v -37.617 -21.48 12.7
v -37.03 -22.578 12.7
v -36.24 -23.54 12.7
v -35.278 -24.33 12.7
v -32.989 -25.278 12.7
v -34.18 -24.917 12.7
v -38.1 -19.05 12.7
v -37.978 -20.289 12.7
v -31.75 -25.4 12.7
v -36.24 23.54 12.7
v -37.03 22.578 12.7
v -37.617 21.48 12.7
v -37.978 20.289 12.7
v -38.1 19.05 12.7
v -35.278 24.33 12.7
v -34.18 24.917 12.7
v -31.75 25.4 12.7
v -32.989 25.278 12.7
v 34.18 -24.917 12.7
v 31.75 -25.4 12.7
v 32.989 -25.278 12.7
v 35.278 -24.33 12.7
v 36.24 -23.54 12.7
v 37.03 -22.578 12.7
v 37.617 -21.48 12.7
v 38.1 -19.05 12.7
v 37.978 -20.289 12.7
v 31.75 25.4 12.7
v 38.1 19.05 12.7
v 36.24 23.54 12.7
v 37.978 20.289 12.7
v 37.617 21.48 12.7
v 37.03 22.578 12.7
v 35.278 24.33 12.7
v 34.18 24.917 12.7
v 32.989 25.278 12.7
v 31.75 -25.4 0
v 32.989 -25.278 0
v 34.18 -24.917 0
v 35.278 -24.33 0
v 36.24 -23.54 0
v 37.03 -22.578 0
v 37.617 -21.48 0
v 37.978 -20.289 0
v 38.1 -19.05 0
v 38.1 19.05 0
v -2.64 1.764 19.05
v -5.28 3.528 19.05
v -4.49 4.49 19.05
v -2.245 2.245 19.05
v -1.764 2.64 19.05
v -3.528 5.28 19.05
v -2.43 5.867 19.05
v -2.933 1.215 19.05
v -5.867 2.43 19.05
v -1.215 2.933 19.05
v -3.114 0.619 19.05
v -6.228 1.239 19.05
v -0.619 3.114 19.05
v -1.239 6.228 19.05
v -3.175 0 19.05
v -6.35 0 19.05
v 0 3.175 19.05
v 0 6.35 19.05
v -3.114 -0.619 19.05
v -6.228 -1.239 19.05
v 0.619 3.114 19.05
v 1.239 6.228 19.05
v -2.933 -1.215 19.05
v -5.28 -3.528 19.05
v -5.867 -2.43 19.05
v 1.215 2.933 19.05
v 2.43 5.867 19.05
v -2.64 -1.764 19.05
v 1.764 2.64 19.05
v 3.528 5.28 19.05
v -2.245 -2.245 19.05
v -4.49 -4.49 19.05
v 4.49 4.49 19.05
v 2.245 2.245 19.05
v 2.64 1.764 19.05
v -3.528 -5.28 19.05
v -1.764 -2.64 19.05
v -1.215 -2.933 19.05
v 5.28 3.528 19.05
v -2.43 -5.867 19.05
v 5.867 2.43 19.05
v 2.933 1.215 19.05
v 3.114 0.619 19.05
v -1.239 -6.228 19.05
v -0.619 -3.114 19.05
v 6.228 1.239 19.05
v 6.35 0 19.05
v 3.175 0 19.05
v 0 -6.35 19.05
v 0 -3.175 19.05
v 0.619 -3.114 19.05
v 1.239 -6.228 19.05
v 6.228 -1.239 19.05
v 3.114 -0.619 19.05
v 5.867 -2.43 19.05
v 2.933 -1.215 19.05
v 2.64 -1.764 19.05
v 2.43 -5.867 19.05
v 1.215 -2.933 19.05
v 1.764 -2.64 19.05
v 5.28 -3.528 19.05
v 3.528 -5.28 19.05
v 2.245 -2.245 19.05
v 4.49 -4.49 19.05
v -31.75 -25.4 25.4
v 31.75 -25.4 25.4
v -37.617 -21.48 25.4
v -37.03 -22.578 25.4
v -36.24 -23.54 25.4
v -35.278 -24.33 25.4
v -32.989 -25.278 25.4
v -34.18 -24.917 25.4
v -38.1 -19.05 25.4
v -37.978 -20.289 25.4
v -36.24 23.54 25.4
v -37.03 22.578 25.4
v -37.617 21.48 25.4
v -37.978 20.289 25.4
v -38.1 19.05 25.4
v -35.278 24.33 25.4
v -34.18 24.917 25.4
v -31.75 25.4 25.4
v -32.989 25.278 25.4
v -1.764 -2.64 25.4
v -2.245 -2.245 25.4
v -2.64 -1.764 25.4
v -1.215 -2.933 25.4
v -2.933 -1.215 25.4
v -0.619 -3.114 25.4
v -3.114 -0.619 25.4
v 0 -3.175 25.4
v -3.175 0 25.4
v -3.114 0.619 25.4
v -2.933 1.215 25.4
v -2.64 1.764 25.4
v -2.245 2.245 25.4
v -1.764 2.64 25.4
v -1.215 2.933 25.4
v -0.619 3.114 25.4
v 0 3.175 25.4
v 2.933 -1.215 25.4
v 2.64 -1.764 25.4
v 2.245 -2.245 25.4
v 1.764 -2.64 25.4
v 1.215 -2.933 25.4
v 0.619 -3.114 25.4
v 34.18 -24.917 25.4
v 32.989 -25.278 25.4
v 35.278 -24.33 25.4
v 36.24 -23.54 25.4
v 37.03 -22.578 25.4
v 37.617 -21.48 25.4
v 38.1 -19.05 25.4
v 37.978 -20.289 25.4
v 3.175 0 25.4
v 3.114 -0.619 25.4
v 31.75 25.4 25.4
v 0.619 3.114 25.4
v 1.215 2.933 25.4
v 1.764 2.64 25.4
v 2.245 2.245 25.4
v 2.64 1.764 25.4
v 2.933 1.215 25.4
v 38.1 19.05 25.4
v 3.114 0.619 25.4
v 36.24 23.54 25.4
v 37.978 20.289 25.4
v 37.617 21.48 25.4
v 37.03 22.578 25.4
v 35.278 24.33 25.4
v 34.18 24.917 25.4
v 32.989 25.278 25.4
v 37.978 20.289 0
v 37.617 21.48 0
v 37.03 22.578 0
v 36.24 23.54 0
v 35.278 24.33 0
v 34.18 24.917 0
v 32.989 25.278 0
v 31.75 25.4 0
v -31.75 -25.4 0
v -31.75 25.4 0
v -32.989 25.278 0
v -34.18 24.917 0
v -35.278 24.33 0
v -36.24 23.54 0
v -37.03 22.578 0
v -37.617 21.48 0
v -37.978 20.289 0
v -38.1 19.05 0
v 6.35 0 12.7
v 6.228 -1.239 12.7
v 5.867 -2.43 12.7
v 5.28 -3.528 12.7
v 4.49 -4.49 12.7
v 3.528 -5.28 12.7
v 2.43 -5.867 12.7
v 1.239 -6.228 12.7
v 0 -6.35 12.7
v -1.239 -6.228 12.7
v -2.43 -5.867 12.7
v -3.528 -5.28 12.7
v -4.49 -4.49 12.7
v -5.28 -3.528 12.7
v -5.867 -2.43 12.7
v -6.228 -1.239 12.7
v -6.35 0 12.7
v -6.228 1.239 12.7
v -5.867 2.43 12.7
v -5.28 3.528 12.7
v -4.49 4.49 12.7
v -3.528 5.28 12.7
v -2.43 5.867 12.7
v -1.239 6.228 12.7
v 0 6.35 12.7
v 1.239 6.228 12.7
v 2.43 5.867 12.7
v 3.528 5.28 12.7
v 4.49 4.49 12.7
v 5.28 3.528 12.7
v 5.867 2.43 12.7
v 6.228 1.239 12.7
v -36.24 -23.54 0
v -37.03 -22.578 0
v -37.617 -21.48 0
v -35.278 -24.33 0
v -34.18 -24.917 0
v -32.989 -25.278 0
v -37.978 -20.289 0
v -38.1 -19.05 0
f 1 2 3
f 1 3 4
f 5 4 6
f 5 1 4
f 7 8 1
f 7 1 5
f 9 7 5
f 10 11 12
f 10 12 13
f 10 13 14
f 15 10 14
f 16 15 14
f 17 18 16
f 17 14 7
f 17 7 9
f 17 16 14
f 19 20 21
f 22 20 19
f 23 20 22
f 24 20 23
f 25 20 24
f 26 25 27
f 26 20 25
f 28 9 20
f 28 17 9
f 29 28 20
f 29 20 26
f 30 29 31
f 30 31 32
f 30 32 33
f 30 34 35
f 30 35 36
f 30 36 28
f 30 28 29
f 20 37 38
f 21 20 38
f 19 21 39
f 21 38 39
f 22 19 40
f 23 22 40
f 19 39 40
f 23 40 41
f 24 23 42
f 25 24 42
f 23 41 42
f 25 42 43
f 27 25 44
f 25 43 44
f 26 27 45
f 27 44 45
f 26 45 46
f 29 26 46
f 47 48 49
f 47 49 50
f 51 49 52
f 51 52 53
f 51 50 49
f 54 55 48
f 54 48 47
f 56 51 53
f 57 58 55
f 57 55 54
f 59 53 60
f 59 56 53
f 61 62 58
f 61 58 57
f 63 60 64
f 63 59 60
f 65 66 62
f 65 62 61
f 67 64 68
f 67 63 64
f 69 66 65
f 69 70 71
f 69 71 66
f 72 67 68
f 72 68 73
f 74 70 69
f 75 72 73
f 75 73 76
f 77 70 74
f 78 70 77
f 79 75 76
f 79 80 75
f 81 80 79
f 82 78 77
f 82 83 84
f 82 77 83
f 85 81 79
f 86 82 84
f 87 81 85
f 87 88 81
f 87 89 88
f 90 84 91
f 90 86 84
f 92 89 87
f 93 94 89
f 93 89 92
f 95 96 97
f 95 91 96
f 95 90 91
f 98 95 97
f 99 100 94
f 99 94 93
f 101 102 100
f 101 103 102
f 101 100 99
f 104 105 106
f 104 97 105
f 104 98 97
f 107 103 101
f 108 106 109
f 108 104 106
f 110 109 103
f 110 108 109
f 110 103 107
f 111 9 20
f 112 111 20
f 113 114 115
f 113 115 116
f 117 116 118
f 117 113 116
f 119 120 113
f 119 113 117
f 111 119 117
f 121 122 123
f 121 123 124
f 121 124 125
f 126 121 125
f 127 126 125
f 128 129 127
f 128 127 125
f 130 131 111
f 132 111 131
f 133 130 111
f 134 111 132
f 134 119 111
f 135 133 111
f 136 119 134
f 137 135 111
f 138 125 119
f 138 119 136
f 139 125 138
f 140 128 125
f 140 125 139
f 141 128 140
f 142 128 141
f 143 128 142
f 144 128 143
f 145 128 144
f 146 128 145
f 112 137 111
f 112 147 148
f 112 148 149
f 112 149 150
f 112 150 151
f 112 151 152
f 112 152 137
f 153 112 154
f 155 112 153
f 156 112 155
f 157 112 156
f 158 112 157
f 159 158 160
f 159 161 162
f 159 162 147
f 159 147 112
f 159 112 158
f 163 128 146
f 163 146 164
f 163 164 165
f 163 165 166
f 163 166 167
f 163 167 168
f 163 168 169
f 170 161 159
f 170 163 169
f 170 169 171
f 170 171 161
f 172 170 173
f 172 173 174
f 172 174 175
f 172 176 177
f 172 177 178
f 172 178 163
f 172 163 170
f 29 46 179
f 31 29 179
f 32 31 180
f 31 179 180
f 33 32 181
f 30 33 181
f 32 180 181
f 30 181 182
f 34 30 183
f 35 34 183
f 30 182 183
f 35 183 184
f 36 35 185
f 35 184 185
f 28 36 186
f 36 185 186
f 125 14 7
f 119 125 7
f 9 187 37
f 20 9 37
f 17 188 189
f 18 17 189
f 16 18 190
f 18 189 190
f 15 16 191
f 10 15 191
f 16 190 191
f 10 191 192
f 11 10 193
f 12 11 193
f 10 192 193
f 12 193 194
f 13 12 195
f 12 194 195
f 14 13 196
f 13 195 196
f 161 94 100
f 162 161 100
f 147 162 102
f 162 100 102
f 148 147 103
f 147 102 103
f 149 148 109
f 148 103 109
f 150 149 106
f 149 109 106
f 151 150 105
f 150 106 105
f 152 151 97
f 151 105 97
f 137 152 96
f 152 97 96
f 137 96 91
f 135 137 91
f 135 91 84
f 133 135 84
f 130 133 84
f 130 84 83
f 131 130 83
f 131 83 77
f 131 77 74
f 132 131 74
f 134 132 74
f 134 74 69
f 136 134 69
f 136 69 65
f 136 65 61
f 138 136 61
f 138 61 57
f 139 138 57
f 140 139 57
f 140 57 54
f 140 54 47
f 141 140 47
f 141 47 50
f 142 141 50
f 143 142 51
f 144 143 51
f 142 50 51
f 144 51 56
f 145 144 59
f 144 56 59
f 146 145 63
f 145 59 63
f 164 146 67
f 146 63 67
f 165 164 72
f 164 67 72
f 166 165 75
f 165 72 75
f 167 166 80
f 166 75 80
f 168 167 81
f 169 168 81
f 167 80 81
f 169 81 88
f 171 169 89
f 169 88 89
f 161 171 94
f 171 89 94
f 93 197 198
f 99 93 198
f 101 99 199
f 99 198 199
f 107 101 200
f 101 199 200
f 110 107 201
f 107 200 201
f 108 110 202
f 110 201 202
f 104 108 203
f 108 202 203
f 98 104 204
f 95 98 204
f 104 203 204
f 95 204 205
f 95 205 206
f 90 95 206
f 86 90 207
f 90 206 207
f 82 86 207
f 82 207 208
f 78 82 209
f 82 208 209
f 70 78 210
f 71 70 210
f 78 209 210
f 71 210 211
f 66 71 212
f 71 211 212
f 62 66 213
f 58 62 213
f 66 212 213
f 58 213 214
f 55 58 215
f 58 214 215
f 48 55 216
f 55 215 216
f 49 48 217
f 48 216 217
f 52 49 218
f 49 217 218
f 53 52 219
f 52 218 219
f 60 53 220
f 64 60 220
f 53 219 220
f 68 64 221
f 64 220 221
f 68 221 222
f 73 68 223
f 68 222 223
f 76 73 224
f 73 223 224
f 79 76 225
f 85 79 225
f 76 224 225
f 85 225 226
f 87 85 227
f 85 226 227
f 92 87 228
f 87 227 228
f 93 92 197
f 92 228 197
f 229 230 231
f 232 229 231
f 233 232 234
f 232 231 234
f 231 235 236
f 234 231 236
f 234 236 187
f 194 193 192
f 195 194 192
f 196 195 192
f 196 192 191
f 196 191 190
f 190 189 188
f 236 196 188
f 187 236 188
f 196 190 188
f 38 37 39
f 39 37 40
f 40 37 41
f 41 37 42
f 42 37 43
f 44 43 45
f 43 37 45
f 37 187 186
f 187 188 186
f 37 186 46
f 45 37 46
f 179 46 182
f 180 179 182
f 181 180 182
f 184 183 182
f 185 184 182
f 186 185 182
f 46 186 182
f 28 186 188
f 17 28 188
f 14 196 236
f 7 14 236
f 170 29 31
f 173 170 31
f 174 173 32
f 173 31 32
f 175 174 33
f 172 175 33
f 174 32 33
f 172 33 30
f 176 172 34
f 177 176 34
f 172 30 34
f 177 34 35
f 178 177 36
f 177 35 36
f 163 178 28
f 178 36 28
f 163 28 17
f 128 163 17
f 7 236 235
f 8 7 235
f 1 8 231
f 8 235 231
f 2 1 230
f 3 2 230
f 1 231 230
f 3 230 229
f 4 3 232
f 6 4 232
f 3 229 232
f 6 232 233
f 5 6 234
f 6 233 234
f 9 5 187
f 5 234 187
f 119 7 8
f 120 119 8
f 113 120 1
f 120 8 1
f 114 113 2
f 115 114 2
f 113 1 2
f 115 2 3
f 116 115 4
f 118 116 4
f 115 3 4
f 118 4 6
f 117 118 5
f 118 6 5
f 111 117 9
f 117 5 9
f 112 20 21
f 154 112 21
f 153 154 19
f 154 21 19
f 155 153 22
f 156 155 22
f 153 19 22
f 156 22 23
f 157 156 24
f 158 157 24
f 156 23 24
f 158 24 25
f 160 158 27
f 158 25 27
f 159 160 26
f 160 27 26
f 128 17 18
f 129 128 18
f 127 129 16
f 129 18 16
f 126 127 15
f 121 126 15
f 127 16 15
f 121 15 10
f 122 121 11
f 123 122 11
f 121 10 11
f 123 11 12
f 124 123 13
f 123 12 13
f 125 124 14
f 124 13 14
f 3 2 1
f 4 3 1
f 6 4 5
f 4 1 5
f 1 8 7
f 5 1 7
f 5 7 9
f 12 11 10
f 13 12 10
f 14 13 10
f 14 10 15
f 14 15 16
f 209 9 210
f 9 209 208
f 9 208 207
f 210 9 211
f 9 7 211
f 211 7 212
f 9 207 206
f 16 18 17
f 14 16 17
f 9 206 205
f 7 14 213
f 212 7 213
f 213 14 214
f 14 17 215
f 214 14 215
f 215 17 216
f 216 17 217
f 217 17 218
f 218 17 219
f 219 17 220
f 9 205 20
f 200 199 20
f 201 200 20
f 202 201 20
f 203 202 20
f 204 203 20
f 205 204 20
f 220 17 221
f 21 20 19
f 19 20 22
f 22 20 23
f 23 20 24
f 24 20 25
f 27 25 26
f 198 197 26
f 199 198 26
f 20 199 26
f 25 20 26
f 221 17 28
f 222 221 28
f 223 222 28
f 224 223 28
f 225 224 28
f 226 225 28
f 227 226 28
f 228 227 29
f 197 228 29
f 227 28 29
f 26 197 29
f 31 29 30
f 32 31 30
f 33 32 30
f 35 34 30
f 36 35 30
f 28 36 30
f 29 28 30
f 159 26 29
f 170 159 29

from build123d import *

# Parameters (mm, degrees)
F1_DEPTH = 12.7
F3_R     = 6.35
F3_R_2   = 3.175
F4_DEPTH = 6.35
F5_DEPTH = 12.7


with BuildPart() as f1:
    # F0 (on Top) → F1 (new body)
    with BuildSketch(Plane.XY):
        with BuildLine():
            Line((31.75, 25.4), (-31.75, 25.4))
            ThreePointArc((-31.75, 25.4), (-36.2401280605, 23.5401280605), (-38.1, 19.05))
            Line((-38.1, 19.05), (-38.1, -19.05))
            ThreePointArc((-38.1, -19.05), (-36.2401280605, -23.5401280605), (-31.75, -25.4))
            Line((-31.75, -25.4), (31.75, -25.4))
            ThreePointArc((31.75, -25.4), (36.2401280605, -23.5401280605), (38.1, -19.05))
            Line((38.1, -19.05), (38.1, 19.05))
            ThreePointArc((38.1, 19.05), (36.2401280605, 23.5401280605), (31.75, 25.4))
        make_face()
    extrude(amount=F1_DEPTH)


with BuildPart() as f2_1:
    # F2: copy of F1
    add(f1.part.moved(Location((0, 0, 12.7))))

    # F3 (on face) → F4 (cut)
    with BuildSketch(Plane(origin=(0, 0, 12.7), x_dir=(1, 0, 0), z_dir=(0, 0, -1))):
        Circle(F3_R)
        Circle(F3_R_2, mode=Mode.SUBTRACT)
        Circle(F3_R_2)
    extrude(amount=-F4_DEPTH, mode=Mode.SUBTRACT)

    # F3 (on face) → F5 (cut, through all)
    with BuildSketch(Plane(origin=(0, 0, 12.7), x_dir=(1, 0, 0), z_dir=(0, 0, -1))):
        Circle(F3_R_2)
    extrude(amount=-F5_DEPTH, mode=Mode.SUBTRACT)


solid = Compound([f1.part, f2_1.part])
